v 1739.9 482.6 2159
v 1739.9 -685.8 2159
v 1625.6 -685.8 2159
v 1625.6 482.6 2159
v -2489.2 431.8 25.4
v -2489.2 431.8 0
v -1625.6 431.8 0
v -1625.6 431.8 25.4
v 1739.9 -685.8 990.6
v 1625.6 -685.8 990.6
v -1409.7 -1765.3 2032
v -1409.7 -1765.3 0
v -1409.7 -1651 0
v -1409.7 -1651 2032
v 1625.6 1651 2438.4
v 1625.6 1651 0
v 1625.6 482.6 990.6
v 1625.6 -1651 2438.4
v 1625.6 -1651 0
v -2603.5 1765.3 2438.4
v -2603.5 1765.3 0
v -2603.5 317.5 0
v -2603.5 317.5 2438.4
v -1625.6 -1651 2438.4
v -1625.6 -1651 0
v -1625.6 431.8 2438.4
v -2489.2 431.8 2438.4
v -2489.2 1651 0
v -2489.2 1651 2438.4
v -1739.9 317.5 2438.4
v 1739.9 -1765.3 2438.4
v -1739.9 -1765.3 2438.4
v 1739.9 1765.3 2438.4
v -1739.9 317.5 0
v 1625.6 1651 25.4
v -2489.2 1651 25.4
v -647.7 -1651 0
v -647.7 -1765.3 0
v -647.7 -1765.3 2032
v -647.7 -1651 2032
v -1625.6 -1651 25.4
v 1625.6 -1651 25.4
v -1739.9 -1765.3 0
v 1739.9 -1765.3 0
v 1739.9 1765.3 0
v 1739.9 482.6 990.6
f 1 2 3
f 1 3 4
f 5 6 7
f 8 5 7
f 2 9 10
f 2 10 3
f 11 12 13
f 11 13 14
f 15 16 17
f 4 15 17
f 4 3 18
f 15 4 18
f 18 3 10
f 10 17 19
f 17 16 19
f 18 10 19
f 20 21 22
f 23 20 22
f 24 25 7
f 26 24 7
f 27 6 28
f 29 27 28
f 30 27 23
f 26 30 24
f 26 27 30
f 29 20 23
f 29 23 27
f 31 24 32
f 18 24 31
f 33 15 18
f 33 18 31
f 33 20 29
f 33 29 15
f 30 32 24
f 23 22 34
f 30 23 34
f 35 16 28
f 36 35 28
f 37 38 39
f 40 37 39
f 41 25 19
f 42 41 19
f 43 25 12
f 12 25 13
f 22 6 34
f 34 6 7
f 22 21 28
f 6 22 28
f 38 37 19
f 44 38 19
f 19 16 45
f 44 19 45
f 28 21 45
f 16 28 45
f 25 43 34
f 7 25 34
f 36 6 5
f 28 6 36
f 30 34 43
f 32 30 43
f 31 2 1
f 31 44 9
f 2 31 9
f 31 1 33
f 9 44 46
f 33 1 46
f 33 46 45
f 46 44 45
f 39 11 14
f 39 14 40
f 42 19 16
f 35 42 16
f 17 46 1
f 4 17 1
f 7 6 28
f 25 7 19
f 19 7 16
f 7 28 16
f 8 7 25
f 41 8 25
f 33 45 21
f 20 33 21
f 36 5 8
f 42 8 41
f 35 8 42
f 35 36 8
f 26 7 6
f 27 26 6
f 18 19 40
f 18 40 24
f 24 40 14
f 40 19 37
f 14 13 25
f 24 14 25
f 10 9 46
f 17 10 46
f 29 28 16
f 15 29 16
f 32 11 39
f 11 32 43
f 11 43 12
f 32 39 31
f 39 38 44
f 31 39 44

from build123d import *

# Parameters (mm, degrees)
F0_W     = 863.6
F0_H     = 1219.2
F1_DEPTH = 25.4
F3_DEPTH = 2438.4
F4_W     = 762
F4_H     = 2032
F5_DEPTH = 114.3
F6_W     = 1168.4
F6_H     = 1168.4
F7_DEPTH = 114.3


with BuildPart() as f1:
    # F0 (on Top) → F1 (new body)
    with BuildSketch(Plane.XY):
        Polygon((-1625.6, 431.8), (-1625.6, -1651), (1625.6, -1651), (1625.6, 1651), (-1625.6, 1651), align=None)
        with Locations((-2057.4, 1041.4)):
            Rectangle(F0_W, F0_H)
    extrude(amount=F1_DEPTH)


with BuildPart() as f3:
    # F2 (on Top) → F3 (new body)
    with BuildSketch(Plane.XY):
        Polygon((1739.9, 1765.3), (-2603.5, 1765.3), (-2603.5, 317.5), (-1739.9, 317.5), (-1739.9, -1765.3), (1739.9, -1765.3), align=None)
        Polygon((-2489.2, 431.8), (-2489.2, 1651), (1625.6, 1651), (1625.6, -1651), (-1625.6, -1651), (-1625.6, 431.8), align=None, mode=Mode.SUBTRACT)
    extrude(amount=F3_DEPTH)

    # F4 (on face) → F5 (cut, through all)
    with BuildSketch(Plane.XZ.offset(1765.3)):
        with Locations((-1028.7, 1016)):
            Rectangle(F4_W, F4_H)
    extrude(amount=-F5_DEPTH, mode=Mode.SUBTRACT)

    # F6 (on face) → F7 (cut, through all)
    with BuildSketch(Plane.YZ.offset(1739.9)):
        with Locations((-101.6, 1574.8)):
            Rectangle(F6_W, F6_H)
    extrude(amount=-F7_DEPTH, mode=Mode.SUBTRACT)


solid = Compound([f1.part, f3.part])
